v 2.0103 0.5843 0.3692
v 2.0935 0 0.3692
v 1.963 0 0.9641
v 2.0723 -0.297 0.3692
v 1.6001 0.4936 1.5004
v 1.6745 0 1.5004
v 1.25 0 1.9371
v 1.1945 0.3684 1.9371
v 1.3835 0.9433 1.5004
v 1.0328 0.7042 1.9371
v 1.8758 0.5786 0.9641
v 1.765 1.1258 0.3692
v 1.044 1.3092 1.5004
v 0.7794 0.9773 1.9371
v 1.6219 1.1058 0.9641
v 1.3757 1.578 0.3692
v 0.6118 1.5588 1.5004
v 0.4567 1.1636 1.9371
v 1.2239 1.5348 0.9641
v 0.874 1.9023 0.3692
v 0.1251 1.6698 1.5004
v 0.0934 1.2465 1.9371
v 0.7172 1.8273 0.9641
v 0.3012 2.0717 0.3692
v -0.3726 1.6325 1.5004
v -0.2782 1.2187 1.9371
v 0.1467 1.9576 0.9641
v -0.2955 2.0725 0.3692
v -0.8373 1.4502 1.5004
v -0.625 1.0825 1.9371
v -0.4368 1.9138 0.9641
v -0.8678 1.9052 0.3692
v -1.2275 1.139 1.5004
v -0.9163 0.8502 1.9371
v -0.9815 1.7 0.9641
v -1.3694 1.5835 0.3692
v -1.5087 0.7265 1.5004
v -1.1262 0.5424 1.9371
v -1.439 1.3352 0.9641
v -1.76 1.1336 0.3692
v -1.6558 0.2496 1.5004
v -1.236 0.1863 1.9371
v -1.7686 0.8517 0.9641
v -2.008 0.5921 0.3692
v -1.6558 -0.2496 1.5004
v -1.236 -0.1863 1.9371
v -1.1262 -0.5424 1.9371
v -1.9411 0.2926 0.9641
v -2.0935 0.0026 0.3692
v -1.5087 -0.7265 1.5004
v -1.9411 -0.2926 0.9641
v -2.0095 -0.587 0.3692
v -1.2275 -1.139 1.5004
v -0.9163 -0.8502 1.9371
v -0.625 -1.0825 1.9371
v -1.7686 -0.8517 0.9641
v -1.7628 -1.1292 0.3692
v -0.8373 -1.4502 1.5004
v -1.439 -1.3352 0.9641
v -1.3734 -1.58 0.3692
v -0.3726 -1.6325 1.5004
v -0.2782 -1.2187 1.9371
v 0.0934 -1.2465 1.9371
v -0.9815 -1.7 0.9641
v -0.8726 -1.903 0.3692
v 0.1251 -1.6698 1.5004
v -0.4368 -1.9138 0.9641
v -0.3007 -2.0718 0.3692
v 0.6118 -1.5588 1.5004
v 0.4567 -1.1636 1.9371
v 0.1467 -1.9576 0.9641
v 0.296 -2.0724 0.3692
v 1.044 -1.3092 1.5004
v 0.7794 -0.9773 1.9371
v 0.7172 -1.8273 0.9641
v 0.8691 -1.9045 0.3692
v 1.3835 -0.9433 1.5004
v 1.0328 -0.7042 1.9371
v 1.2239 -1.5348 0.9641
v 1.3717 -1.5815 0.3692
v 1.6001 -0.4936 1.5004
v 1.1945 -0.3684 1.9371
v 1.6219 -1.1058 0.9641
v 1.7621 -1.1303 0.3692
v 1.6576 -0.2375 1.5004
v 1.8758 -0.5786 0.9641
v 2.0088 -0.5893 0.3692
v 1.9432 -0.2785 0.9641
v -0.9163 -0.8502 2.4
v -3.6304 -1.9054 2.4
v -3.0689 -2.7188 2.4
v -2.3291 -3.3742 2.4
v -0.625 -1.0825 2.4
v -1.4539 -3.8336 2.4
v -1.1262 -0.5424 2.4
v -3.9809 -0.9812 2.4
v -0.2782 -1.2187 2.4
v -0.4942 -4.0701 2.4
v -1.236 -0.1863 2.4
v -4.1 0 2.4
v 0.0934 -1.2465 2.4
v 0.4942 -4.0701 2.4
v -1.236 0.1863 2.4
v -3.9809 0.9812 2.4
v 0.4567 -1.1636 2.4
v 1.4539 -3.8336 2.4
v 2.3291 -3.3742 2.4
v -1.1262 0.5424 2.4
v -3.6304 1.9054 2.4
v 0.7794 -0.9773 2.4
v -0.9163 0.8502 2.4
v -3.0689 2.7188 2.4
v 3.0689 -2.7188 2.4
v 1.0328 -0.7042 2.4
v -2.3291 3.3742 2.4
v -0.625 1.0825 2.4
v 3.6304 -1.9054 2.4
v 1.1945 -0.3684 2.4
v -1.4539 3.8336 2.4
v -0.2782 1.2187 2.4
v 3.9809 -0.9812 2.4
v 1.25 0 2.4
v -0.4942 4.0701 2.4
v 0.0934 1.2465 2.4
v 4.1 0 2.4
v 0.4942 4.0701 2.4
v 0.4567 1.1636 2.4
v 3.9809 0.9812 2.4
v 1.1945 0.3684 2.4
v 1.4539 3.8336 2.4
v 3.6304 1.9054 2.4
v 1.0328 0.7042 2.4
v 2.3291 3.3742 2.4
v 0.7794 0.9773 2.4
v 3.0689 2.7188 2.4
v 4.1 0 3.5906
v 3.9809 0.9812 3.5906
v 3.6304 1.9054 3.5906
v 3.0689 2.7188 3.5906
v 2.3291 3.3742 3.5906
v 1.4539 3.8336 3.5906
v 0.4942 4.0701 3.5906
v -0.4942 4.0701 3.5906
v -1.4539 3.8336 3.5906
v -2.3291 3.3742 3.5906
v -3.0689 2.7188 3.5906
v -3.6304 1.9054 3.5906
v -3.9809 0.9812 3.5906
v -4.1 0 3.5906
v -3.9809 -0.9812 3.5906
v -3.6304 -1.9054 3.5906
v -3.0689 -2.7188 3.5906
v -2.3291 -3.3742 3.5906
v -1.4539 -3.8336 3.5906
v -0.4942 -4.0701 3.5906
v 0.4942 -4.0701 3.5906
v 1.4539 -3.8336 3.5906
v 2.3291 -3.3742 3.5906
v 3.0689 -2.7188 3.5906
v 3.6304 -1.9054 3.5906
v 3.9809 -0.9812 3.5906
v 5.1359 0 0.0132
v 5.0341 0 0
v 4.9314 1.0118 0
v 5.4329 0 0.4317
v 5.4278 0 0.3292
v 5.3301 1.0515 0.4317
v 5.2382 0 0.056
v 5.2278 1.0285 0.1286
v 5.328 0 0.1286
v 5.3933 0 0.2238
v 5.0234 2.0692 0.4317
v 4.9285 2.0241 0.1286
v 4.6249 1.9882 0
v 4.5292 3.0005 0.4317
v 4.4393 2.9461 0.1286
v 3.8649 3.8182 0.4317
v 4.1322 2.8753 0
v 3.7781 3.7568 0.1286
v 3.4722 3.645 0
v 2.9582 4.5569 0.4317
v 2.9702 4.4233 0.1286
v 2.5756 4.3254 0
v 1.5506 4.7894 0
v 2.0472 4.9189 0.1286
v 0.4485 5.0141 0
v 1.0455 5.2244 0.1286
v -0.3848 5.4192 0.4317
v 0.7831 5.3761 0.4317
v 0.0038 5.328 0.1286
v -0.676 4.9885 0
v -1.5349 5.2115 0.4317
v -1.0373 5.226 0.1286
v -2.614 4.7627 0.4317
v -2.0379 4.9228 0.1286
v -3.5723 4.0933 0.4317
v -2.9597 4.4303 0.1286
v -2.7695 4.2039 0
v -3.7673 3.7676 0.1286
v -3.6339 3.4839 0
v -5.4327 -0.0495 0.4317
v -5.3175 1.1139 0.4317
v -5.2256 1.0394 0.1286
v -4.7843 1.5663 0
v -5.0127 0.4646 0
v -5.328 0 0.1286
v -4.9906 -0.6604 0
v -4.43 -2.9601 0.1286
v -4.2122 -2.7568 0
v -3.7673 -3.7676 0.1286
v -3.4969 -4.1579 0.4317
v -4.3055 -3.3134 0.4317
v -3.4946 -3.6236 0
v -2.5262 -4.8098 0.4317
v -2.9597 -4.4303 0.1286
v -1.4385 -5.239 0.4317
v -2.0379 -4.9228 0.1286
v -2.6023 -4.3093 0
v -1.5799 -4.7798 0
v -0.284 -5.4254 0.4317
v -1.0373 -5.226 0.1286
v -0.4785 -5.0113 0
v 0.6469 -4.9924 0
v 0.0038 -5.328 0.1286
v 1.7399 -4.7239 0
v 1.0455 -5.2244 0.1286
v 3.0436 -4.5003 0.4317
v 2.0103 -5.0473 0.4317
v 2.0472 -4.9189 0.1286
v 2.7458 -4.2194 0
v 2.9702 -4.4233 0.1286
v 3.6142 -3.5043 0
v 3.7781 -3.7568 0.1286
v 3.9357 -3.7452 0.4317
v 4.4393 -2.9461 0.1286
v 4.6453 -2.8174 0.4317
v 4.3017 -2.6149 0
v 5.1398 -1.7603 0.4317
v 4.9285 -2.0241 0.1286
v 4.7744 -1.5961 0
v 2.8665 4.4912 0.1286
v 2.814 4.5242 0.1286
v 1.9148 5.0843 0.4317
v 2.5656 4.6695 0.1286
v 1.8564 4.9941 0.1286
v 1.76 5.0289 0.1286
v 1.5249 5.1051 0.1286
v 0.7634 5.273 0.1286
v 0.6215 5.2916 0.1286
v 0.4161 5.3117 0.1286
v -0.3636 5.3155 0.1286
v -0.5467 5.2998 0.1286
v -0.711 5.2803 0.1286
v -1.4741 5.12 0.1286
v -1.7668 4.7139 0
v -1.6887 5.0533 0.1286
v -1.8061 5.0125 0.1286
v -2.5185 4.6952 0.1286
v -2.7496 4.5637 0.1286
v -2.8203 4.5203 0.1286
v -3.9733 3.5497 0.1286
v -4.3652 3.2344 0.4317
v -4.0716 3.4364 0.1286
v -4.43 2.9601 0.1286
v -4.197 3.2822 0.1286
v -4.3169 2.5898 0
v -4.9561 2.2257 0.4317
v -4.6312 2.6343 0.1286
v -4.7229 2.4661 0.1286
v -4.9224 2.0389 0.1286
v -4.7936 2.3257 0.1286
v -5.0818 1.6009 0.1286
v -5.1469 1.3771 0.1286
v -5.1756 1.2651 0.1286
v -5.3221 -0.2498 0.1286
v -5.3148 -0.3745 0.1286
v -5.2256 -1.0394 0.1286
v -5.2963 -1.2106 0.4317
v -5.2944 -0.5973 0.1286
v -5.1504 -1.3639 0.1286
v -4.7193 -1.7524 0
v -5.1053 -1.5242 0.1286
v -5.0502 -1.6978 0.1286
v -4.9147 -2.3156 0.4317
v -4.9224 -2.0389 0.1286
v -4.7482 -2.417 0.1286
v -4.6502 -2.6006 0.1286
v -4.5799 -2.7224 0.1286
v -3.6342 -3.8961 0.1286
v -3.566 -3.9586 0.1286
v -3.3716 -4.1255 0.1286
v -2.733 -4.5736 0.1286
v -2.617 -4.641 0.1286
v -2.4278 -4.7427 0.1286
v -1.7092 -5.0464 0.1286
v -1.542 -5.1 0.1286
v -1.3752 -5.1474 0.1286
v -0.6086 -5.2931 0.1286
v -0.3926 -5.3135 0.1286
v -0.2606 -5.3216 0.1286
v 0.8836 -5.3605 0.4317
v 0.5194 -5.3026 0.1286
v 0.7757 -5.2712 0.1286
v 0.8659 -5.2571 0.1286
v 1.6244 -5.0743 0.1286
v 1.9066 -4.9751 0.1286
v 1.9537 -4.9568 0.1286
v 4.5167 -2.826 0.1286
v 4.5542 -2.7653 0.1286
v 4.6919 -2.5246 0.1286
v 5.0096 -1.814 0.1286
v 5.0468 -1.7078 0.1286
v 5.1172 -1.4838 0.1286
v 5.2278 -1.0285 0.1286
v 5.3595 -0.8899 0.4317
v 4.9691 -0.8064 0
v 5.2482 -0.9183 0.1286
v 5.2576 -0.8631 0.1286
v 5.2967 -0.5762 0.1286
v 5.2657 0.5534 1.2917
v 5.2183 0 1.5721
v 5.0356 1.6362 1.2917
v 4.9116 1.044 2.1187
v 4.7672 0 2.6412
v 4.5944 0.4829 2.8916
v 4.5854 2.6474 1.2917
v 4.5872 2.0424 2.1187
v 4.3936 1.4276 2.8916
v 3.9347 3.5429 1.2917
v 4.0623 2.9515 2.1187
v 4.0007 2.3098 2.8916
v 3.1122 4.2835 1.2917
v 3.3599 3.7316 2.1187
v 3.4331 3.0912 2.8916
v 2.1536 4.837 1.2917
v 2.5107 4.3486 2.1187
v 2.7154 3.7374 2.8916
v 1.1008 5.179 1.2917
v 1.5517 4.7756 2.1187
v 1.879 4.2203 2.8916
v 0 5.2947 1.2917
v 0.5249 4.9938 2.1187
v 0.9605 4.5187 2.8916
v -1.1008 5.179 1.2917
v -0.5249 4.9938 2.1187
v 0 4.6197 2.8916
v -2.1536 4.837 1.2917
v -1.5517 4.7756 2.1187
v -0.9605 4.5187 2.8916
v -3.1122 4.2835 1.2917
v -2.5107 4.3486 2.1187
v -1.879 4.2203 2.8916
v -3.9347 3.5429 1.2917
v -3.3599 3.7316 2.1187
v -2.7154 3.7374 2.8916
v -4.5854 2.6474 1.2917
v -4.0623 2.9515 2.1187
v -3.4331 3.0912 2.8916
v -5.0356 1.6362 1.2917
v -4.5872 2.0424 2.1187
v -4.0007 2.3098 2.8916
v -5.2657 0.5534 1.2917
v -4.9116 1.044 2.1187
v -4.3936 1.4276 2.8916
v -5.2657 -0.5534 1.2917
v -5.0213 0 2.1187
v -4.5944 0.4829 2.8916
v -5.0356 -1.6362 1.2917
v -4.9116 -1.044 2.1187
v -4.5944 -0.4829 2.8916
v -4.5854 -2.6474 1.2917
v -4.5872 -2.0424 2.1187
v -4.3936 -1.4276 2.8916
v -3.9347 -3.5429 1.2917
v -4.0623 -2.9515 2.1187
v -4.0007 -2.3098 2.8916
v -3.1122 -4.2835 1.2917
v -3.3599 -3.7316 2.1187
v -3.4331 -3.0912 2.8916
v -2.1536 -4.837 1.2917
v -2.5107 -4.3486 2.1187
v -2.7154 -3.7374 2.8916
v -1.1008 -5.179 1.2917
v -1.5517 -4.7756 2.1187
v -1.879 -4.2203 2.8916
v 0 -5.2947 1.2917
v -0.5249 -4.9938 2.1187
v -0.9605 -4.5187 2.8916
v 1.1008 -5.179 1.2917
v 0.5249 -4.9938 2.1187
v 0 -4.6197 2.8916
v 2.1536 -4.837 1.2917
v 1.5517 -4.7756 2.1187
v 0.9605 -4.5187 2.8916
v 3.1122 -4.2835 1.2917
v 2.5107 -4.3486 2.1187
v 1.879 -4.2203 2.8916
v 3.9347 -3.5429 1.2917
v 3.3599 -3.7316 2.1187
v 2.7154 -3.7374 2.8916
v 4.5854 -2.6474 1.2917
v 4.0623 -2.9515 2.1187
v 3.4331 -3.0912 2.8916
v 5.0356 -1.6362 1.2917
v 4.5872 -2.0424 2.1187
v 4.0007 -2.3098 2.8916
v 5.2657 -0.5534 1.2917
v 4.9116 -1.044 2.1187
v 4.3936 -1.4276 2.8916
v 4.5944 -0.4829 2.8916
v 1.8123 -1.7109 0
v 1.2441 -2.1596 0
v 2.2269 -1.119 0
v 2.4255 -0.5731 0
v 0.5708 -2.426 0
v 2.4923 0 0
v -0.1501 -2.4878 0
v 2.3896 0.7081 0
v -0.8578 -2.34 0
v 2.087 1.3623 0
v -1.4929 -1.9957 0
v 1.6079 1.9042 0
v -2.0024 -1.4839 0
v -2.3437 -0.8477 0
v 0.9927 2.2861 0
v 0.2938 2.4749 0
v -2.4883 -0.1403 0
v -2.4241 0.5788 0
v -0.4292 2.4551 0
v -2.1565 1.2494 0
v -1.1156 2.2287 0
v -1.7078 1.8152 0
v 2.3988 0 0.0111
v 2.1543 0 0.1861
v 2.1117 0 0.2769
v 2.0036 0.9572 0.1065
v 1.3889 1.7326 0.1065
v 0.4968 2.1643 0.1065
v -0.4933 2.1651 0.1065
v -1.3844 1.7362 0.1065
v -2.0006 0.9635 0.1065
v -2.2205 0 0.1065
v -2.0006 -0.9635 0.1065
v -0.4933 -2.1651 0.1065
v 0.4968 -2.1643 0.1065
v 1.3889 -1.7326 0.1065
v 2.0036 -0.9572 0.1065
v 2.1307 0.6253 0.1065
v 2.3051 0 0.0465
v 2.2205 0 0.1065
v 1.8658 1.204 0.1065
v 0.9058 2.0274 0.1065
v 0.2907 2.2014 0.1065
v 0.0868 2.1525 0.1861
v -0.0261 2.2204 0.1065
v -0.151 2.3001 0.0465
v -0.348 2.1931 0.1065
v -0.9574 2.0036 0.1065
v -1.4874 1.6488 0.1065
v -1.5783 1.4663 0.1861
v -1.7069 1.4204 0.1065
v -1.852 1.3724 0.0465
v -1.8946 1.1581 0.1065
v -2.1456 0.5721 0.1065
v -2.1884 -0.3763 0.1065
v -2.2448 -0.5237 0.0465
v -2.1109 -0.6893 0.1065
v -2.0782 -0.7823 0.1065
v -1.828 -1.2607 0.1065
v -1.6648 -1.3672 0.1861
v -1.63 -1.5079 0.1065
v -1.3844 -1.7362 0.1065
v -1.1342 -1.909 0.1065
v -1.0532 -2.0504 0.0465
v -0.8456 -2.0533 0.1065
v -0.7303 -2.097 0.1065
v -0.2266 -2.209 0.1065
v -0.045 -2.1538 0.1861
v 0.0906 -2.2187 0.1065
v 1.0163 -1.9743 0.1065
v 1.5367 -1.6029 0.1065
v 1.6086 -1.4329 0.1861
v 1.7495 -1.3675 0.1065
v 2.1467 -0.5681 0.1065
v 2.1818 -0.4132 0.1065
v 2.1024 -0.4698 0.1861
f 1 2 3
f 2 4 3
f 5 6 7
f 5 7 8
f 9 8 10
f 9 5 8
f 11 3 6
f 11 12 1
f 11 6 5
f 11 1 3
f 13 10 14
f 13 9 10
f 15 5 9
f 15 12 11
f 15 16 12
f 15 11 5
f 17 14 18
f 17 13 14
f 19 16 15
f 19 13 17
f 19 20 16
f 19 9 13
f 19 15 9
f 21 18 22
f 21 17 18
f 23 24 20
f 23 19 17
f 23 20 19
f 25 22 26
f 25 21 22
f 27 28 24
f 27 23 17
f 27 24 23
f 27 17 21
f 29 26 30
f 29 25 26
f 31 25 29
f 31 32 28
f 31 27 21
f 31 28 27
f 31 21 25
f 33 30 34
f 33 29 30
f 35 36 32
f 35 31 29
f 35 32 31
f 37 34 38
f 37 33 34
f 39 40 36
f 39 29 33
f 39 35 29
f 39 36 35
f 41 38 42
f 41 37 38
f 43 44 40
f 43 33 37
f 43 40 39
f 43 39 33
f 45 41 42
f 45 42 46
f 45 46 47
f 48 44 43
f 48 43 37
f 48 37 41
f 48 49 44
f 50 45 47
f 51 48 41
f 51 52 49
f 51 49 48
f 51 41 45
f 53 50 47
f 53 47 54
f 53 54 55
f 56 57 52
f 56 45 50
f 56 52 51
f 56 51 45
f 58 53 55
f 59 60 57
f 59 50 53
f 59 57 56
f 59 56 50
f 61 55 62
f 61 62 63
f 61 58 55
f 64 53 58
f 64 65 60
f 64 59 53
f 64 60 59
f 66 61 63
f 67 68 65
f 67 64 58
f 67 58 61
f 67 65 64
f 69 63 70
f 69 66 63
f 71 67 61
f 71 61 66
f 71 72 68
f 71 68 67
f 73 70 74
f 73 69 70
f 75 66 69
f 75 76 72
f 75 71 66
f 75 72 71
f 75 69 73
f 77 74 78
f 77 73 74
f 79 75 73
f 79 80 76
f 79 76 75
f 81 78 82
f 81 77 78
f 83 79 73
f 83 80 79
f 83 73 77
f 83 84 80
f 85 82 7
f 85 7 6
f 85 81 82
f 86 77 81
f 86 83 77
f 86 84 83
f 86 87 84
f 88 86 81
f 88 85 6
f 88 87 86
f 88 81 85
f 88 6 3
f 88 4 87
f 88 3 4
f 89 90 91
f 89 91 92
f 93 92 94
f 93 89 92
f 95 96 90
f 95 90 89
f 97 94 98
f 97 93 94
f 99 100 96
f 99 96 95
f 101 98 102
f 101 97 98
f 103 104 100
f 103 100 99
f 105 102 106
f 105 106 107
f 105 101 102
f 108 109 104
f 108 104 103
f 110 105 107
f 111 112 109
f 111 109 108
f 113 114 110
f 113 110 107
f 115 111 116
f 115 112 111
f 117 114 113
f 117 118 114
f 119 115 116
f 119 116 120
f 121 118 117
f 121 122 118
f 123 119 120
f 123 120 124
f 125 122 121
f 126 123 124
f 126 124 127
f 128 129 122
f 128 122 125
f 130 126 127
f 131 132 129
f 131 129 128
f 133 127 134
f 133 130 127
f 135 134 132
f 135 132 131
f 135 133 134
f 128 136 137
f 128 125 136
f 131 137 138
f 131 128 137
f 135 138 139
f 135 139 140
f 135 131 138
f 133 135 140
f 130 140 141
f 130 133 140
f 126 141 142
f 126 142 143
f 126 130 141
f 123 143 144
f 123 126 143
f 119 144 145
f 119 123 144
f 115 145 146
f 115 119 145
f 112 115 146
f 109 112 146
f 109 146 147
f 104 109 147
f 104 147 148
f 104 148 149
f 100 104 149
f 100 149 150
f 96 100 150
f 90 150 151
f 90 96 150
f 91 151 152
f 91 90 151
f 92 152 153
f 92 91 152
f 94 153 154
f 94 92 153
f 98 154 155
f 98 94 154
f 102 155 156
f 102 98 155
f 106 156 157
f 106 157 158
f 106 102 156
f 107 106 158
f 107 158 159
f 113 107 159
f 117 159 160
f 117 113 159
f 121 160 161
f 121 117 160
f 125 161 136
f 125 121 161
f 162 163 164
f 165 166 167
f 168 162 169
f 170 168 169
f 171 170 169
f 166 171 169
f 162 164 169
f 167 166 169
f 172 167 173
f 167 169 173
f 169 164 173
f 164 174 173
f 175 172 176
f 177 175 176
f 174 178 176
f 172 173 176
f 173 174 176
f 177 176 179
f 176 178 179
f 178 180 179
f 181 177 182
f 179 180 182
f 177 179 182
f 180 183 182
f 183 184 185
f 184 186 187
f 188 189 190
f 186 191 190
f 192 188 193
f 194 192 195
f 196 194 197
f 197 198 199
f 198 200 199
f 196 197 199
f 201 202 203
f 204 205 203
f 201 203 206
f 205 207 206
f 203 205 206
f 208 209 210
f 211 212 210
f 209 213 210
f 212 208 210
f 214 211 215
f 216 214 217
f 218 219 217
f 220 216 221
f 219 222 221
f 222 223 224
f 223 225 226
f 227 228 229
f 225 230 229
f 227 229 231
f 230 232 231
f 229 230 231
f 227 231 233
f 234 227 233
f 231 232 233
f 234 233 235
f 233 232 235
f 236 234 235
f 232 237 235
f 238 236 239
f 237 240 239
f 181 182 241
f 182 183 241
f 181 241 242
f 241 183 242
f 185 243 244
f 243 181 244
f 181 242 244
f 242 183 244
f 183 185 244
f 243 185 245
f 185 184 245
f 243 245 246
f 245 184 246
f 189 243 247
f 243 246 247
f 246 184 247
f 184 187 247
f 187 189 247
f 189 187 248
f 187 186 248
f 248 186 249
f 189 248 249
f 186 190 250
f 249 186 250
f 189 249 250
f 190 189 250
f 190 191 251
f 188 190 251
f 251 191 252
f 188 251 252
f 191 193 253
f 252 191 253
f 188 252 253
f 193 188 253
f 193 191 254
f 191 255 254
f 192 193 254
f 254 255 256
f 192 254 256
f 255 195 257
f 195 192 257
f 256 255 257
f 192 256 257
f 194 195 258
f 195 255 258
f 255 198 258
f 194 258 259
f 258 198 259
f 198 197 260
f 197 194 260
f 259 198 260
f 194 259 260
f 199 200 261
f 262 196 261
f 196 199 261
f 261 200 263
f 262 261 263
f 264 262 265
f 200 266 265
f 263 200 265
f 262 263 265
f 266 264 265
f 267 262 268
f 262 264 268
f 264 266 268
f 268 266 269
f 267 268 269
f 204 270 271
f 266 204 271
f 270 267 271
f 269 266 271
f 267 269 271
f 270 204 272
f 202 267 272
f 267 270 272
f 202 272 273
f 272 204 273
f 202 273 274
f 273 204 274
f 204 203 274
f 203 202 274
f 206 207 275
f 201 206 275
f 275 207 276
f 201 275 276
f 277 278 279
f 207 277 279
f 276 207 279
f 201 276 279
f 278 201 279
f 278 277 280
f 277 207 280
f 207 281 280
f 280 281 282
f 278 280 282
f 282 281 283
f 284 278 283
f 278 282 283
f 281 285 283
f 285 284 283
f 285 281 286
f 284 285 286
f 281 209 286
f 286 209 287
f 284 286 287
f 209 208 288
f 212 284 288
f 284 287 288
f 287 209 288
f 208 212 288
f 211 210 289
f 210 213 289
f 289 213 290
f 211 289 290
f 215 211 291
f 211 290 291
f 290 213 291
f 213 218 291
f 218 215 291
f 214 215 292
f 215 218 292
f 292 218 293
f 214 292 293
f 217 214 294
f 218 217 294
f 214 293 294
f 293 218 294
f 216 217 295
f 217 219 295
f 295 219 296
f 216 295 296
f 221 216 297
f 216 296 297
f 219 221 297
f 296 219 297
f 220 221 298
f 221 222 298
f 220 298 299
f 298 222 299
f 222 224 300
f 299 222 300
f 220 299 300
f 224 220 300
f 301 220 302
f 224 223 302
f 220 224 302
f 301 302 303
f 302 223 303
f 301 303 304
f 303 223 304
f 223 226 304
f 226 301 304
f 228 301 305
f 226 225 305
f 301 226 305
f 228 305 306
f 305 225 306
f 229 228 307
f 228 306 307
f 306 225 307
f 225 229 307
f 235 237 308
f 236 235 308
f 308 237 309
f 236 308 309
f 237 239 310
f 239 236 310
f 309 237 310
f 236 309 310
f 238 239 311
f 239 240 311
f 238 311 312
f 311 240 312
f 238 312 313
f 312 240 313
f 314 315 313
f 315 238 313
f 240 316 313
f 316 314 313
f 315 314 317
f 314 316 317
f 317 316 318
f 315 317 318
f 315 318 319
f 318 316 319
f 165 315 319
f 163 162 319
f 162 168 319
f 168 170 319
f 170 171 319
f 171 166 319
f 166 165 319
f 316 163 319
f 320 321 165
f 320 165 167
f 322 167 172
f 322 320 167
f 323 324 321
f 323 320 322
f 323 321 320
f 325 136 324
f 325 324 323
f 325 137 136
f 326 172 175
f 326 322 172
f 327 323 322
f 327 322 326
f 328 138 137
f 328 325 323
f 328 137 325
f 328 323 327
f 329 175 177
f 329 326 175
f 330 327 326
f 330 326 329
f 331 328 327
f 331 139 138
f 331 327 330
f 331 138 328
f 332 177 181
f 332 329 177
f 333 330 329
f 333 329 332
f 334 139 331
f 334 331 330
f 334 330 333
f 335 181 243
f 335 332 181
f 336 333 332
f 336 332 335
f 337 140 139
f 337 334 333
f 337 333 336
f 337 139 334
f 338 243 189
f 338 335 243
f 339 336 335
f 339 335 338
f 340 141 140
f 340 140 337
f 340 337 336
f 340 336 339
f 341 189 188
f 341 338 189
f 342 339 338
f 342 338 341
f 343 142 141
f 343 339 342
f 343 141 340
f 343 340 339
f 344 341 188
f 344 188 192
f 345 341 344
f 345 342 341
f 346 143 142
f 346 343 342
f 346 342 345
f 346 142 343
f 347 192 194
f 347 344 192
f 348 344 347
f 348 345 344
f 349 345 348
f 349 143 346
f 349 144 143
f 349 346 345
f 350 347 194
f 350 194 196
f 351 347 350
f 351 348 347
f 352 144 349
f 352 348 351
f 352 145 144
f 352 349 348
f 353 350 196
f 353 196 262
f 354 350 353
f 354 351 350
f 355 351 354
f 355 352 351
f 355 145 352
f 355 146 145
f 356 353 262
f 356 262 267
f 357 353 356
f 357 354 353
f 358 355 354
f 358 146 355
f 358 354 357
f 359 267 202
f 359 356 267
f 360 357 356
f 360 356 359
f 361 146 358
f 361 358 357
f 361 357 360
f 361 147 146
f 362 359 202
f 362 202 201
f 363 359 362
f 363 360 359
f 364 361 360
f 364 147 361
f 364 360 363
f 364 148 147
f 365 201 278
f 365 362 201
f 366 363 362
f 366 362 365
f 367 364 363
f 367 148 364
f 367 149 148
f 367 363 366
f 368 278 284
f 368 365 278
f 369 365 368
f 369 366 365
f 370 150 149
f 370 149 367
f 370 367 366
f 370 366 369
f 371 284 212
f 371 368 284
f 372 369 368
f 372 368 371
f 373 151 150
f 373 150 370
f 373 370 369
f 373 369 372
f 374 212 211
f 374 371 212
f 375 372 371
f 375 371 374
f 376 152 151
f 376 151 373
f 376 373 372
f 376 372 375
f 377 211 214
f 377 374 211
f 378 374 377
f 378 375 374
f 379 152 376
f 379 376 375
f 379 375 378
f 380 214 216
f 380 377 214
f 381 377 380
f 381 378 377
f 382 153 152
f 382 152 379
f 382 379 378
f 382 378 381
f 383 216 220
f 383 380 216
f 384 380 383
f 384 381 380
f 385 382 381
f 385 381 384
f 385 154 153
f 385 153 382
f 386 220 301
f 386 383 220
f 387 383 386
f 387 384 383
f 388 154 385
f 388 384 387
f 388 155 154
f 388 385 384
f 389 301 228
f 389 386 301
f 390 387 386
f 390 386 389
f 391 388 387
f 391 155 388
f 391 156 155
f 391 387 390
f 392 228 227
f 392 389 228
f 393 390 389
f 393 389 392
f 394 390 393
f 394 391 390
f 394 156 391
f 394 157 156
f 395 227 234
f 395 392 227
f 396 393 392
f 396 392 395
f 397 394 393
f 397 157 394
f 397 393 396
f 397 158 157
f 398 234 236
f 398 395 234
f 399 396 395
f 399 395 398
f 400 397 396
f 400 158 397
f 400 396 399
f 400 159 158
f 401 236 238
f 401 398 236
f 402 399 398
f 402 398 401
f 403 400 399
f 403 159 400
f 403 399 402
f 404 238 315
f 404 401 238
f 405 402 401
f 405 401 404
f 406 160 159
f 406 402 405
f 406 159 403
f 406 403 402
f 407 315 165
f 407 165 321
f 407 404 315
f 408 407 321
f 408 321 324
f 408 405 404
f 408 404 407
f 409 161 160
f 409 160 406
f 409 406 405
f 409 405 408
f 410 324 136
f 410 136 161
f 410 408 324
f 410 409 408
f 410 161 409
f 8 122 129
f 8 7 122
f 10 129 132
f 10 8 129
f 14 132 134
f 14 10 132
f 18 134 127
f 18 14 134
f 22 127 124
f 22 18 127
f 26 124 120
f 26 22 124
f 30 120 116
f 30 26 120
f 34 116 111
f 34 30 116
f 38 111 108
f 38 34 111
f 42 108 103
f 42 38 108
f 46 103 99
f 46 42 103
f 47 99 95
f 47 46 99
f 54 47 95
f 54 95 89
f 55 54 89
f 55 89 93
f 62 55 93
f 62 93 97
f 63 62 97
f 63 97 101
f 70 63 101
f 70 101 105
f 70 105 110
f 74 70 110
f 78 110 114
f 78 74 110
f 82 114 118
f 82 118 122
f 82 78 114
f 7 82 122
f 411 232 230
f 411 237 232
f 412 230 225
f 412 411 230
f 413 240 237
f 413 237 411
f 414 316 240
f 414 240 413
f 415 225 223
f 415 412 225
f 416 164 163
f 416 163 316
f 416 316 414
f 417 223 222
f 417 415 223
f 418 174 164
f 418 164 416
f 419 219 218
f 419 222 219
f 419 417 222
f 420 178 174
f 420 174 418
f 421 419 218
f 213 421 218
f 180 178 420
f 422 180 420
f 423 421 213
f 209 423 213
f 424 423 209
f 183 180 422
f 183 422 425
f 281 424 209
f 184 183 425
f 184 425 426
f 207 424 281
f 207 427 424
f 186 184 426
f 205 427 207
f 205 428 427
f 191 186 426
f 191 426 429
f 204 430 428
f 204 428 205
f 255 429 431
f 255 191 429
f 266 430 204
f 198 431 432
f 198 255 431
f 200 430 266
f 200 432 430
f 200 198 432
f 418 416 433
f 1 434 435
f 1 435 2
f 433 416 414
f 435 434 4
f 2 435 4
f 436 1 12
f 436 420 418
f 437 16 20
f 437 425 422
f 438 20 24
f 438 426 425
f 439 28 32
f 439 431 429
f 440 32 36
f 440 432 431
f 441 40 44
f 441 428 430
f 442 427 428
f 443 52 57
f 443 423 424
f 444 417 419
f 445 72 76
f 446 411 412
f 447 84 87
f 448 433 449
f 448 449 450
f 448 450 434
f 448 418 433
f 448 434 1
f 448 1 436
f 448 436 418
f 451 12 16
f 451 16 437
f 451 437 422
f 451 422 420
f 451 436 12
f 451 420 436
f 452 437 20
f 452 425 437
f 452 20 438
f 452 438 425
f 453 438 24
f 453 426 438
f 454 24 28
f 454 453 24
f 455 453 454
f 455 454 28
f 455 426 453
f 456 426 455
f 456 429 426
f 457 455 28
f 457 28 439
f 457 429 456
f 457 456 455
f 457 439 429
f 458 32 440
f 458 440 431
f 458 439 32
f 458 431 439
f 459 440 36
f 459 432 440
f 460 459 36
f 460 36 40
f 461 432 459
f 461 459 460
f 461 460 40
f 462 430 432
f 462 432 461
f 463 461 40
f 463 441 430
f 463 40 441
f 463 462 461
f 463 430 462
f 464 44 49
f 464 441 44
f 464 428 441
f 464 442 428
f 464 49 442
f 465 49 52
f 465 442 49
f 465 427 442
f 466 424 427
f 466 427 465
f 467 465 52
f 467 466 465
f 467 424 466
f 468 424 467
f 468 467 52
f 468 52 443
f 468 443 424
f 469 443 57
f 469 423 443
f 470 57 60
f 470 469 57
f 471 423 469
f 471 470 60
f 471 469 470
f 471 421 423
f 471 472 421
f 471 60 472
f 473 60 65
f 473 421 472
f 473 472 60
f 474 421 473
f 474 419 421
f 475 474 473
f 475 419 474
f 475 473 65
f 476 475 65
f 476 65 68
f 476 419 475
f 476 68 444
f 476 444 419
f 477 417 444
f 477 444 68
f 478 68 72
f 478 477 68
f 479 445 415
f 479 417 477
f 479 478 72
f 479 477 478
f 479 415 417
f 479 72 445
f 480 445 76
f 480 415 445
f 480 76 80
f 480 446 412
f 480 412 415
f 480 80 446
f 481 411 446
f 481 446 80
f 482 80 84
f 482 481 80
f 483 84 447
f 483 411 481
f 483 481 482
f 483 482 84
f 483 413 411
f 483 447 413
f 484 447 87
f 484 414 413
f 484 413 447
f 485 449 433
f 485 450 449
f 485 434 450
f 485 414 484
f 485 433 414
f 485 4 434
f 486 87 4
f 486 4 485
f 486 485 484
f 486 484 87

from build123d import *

# Parameters (mm, degrees)
BOTTOM_FILLET_R = 0.4


with BuildPart() as part:
    # Sketch2 → Main Body (revolve)
    with BuildSketch(Plane(origin=(0, 0, 0), x_dir=(1, 0, 0), z_dir=(0, 1, 0))):
        with BuildLine():
            Line((2.1, 0), (5.45, 0))
            ThreePointArc((5.45, 0), (5.101347861, -1.918006778), (4.1, -3.590612761))
            Line((4.1, -3.590612761), (4.1, -2.4))
            Line((4.1, -2.4), (1.25, -2.4))
            Line((1.25, -2.4), (1.25, -1.937095277))
            ThreePointArc((1.25, -1.937095277), (1.876107285, -1.16695398), (2.1, -0.2))
            Line((2.1, -0.2), (2.1, 0))
        make_face()
    revolve(axis=Axis((0, 0, 0), (0, 0, 1)))

    # Bottom Fillet
    bottom_fillet_edges = [part.edges().sort_by_distance(p)[0] for p in [
        (-5.45, 0, 0),
        (-2.1, 0, 0),
    ]]
    fillet(bottom_fillet_edges, radius=BOTTOM_FILLET_R)


solid = part.part
